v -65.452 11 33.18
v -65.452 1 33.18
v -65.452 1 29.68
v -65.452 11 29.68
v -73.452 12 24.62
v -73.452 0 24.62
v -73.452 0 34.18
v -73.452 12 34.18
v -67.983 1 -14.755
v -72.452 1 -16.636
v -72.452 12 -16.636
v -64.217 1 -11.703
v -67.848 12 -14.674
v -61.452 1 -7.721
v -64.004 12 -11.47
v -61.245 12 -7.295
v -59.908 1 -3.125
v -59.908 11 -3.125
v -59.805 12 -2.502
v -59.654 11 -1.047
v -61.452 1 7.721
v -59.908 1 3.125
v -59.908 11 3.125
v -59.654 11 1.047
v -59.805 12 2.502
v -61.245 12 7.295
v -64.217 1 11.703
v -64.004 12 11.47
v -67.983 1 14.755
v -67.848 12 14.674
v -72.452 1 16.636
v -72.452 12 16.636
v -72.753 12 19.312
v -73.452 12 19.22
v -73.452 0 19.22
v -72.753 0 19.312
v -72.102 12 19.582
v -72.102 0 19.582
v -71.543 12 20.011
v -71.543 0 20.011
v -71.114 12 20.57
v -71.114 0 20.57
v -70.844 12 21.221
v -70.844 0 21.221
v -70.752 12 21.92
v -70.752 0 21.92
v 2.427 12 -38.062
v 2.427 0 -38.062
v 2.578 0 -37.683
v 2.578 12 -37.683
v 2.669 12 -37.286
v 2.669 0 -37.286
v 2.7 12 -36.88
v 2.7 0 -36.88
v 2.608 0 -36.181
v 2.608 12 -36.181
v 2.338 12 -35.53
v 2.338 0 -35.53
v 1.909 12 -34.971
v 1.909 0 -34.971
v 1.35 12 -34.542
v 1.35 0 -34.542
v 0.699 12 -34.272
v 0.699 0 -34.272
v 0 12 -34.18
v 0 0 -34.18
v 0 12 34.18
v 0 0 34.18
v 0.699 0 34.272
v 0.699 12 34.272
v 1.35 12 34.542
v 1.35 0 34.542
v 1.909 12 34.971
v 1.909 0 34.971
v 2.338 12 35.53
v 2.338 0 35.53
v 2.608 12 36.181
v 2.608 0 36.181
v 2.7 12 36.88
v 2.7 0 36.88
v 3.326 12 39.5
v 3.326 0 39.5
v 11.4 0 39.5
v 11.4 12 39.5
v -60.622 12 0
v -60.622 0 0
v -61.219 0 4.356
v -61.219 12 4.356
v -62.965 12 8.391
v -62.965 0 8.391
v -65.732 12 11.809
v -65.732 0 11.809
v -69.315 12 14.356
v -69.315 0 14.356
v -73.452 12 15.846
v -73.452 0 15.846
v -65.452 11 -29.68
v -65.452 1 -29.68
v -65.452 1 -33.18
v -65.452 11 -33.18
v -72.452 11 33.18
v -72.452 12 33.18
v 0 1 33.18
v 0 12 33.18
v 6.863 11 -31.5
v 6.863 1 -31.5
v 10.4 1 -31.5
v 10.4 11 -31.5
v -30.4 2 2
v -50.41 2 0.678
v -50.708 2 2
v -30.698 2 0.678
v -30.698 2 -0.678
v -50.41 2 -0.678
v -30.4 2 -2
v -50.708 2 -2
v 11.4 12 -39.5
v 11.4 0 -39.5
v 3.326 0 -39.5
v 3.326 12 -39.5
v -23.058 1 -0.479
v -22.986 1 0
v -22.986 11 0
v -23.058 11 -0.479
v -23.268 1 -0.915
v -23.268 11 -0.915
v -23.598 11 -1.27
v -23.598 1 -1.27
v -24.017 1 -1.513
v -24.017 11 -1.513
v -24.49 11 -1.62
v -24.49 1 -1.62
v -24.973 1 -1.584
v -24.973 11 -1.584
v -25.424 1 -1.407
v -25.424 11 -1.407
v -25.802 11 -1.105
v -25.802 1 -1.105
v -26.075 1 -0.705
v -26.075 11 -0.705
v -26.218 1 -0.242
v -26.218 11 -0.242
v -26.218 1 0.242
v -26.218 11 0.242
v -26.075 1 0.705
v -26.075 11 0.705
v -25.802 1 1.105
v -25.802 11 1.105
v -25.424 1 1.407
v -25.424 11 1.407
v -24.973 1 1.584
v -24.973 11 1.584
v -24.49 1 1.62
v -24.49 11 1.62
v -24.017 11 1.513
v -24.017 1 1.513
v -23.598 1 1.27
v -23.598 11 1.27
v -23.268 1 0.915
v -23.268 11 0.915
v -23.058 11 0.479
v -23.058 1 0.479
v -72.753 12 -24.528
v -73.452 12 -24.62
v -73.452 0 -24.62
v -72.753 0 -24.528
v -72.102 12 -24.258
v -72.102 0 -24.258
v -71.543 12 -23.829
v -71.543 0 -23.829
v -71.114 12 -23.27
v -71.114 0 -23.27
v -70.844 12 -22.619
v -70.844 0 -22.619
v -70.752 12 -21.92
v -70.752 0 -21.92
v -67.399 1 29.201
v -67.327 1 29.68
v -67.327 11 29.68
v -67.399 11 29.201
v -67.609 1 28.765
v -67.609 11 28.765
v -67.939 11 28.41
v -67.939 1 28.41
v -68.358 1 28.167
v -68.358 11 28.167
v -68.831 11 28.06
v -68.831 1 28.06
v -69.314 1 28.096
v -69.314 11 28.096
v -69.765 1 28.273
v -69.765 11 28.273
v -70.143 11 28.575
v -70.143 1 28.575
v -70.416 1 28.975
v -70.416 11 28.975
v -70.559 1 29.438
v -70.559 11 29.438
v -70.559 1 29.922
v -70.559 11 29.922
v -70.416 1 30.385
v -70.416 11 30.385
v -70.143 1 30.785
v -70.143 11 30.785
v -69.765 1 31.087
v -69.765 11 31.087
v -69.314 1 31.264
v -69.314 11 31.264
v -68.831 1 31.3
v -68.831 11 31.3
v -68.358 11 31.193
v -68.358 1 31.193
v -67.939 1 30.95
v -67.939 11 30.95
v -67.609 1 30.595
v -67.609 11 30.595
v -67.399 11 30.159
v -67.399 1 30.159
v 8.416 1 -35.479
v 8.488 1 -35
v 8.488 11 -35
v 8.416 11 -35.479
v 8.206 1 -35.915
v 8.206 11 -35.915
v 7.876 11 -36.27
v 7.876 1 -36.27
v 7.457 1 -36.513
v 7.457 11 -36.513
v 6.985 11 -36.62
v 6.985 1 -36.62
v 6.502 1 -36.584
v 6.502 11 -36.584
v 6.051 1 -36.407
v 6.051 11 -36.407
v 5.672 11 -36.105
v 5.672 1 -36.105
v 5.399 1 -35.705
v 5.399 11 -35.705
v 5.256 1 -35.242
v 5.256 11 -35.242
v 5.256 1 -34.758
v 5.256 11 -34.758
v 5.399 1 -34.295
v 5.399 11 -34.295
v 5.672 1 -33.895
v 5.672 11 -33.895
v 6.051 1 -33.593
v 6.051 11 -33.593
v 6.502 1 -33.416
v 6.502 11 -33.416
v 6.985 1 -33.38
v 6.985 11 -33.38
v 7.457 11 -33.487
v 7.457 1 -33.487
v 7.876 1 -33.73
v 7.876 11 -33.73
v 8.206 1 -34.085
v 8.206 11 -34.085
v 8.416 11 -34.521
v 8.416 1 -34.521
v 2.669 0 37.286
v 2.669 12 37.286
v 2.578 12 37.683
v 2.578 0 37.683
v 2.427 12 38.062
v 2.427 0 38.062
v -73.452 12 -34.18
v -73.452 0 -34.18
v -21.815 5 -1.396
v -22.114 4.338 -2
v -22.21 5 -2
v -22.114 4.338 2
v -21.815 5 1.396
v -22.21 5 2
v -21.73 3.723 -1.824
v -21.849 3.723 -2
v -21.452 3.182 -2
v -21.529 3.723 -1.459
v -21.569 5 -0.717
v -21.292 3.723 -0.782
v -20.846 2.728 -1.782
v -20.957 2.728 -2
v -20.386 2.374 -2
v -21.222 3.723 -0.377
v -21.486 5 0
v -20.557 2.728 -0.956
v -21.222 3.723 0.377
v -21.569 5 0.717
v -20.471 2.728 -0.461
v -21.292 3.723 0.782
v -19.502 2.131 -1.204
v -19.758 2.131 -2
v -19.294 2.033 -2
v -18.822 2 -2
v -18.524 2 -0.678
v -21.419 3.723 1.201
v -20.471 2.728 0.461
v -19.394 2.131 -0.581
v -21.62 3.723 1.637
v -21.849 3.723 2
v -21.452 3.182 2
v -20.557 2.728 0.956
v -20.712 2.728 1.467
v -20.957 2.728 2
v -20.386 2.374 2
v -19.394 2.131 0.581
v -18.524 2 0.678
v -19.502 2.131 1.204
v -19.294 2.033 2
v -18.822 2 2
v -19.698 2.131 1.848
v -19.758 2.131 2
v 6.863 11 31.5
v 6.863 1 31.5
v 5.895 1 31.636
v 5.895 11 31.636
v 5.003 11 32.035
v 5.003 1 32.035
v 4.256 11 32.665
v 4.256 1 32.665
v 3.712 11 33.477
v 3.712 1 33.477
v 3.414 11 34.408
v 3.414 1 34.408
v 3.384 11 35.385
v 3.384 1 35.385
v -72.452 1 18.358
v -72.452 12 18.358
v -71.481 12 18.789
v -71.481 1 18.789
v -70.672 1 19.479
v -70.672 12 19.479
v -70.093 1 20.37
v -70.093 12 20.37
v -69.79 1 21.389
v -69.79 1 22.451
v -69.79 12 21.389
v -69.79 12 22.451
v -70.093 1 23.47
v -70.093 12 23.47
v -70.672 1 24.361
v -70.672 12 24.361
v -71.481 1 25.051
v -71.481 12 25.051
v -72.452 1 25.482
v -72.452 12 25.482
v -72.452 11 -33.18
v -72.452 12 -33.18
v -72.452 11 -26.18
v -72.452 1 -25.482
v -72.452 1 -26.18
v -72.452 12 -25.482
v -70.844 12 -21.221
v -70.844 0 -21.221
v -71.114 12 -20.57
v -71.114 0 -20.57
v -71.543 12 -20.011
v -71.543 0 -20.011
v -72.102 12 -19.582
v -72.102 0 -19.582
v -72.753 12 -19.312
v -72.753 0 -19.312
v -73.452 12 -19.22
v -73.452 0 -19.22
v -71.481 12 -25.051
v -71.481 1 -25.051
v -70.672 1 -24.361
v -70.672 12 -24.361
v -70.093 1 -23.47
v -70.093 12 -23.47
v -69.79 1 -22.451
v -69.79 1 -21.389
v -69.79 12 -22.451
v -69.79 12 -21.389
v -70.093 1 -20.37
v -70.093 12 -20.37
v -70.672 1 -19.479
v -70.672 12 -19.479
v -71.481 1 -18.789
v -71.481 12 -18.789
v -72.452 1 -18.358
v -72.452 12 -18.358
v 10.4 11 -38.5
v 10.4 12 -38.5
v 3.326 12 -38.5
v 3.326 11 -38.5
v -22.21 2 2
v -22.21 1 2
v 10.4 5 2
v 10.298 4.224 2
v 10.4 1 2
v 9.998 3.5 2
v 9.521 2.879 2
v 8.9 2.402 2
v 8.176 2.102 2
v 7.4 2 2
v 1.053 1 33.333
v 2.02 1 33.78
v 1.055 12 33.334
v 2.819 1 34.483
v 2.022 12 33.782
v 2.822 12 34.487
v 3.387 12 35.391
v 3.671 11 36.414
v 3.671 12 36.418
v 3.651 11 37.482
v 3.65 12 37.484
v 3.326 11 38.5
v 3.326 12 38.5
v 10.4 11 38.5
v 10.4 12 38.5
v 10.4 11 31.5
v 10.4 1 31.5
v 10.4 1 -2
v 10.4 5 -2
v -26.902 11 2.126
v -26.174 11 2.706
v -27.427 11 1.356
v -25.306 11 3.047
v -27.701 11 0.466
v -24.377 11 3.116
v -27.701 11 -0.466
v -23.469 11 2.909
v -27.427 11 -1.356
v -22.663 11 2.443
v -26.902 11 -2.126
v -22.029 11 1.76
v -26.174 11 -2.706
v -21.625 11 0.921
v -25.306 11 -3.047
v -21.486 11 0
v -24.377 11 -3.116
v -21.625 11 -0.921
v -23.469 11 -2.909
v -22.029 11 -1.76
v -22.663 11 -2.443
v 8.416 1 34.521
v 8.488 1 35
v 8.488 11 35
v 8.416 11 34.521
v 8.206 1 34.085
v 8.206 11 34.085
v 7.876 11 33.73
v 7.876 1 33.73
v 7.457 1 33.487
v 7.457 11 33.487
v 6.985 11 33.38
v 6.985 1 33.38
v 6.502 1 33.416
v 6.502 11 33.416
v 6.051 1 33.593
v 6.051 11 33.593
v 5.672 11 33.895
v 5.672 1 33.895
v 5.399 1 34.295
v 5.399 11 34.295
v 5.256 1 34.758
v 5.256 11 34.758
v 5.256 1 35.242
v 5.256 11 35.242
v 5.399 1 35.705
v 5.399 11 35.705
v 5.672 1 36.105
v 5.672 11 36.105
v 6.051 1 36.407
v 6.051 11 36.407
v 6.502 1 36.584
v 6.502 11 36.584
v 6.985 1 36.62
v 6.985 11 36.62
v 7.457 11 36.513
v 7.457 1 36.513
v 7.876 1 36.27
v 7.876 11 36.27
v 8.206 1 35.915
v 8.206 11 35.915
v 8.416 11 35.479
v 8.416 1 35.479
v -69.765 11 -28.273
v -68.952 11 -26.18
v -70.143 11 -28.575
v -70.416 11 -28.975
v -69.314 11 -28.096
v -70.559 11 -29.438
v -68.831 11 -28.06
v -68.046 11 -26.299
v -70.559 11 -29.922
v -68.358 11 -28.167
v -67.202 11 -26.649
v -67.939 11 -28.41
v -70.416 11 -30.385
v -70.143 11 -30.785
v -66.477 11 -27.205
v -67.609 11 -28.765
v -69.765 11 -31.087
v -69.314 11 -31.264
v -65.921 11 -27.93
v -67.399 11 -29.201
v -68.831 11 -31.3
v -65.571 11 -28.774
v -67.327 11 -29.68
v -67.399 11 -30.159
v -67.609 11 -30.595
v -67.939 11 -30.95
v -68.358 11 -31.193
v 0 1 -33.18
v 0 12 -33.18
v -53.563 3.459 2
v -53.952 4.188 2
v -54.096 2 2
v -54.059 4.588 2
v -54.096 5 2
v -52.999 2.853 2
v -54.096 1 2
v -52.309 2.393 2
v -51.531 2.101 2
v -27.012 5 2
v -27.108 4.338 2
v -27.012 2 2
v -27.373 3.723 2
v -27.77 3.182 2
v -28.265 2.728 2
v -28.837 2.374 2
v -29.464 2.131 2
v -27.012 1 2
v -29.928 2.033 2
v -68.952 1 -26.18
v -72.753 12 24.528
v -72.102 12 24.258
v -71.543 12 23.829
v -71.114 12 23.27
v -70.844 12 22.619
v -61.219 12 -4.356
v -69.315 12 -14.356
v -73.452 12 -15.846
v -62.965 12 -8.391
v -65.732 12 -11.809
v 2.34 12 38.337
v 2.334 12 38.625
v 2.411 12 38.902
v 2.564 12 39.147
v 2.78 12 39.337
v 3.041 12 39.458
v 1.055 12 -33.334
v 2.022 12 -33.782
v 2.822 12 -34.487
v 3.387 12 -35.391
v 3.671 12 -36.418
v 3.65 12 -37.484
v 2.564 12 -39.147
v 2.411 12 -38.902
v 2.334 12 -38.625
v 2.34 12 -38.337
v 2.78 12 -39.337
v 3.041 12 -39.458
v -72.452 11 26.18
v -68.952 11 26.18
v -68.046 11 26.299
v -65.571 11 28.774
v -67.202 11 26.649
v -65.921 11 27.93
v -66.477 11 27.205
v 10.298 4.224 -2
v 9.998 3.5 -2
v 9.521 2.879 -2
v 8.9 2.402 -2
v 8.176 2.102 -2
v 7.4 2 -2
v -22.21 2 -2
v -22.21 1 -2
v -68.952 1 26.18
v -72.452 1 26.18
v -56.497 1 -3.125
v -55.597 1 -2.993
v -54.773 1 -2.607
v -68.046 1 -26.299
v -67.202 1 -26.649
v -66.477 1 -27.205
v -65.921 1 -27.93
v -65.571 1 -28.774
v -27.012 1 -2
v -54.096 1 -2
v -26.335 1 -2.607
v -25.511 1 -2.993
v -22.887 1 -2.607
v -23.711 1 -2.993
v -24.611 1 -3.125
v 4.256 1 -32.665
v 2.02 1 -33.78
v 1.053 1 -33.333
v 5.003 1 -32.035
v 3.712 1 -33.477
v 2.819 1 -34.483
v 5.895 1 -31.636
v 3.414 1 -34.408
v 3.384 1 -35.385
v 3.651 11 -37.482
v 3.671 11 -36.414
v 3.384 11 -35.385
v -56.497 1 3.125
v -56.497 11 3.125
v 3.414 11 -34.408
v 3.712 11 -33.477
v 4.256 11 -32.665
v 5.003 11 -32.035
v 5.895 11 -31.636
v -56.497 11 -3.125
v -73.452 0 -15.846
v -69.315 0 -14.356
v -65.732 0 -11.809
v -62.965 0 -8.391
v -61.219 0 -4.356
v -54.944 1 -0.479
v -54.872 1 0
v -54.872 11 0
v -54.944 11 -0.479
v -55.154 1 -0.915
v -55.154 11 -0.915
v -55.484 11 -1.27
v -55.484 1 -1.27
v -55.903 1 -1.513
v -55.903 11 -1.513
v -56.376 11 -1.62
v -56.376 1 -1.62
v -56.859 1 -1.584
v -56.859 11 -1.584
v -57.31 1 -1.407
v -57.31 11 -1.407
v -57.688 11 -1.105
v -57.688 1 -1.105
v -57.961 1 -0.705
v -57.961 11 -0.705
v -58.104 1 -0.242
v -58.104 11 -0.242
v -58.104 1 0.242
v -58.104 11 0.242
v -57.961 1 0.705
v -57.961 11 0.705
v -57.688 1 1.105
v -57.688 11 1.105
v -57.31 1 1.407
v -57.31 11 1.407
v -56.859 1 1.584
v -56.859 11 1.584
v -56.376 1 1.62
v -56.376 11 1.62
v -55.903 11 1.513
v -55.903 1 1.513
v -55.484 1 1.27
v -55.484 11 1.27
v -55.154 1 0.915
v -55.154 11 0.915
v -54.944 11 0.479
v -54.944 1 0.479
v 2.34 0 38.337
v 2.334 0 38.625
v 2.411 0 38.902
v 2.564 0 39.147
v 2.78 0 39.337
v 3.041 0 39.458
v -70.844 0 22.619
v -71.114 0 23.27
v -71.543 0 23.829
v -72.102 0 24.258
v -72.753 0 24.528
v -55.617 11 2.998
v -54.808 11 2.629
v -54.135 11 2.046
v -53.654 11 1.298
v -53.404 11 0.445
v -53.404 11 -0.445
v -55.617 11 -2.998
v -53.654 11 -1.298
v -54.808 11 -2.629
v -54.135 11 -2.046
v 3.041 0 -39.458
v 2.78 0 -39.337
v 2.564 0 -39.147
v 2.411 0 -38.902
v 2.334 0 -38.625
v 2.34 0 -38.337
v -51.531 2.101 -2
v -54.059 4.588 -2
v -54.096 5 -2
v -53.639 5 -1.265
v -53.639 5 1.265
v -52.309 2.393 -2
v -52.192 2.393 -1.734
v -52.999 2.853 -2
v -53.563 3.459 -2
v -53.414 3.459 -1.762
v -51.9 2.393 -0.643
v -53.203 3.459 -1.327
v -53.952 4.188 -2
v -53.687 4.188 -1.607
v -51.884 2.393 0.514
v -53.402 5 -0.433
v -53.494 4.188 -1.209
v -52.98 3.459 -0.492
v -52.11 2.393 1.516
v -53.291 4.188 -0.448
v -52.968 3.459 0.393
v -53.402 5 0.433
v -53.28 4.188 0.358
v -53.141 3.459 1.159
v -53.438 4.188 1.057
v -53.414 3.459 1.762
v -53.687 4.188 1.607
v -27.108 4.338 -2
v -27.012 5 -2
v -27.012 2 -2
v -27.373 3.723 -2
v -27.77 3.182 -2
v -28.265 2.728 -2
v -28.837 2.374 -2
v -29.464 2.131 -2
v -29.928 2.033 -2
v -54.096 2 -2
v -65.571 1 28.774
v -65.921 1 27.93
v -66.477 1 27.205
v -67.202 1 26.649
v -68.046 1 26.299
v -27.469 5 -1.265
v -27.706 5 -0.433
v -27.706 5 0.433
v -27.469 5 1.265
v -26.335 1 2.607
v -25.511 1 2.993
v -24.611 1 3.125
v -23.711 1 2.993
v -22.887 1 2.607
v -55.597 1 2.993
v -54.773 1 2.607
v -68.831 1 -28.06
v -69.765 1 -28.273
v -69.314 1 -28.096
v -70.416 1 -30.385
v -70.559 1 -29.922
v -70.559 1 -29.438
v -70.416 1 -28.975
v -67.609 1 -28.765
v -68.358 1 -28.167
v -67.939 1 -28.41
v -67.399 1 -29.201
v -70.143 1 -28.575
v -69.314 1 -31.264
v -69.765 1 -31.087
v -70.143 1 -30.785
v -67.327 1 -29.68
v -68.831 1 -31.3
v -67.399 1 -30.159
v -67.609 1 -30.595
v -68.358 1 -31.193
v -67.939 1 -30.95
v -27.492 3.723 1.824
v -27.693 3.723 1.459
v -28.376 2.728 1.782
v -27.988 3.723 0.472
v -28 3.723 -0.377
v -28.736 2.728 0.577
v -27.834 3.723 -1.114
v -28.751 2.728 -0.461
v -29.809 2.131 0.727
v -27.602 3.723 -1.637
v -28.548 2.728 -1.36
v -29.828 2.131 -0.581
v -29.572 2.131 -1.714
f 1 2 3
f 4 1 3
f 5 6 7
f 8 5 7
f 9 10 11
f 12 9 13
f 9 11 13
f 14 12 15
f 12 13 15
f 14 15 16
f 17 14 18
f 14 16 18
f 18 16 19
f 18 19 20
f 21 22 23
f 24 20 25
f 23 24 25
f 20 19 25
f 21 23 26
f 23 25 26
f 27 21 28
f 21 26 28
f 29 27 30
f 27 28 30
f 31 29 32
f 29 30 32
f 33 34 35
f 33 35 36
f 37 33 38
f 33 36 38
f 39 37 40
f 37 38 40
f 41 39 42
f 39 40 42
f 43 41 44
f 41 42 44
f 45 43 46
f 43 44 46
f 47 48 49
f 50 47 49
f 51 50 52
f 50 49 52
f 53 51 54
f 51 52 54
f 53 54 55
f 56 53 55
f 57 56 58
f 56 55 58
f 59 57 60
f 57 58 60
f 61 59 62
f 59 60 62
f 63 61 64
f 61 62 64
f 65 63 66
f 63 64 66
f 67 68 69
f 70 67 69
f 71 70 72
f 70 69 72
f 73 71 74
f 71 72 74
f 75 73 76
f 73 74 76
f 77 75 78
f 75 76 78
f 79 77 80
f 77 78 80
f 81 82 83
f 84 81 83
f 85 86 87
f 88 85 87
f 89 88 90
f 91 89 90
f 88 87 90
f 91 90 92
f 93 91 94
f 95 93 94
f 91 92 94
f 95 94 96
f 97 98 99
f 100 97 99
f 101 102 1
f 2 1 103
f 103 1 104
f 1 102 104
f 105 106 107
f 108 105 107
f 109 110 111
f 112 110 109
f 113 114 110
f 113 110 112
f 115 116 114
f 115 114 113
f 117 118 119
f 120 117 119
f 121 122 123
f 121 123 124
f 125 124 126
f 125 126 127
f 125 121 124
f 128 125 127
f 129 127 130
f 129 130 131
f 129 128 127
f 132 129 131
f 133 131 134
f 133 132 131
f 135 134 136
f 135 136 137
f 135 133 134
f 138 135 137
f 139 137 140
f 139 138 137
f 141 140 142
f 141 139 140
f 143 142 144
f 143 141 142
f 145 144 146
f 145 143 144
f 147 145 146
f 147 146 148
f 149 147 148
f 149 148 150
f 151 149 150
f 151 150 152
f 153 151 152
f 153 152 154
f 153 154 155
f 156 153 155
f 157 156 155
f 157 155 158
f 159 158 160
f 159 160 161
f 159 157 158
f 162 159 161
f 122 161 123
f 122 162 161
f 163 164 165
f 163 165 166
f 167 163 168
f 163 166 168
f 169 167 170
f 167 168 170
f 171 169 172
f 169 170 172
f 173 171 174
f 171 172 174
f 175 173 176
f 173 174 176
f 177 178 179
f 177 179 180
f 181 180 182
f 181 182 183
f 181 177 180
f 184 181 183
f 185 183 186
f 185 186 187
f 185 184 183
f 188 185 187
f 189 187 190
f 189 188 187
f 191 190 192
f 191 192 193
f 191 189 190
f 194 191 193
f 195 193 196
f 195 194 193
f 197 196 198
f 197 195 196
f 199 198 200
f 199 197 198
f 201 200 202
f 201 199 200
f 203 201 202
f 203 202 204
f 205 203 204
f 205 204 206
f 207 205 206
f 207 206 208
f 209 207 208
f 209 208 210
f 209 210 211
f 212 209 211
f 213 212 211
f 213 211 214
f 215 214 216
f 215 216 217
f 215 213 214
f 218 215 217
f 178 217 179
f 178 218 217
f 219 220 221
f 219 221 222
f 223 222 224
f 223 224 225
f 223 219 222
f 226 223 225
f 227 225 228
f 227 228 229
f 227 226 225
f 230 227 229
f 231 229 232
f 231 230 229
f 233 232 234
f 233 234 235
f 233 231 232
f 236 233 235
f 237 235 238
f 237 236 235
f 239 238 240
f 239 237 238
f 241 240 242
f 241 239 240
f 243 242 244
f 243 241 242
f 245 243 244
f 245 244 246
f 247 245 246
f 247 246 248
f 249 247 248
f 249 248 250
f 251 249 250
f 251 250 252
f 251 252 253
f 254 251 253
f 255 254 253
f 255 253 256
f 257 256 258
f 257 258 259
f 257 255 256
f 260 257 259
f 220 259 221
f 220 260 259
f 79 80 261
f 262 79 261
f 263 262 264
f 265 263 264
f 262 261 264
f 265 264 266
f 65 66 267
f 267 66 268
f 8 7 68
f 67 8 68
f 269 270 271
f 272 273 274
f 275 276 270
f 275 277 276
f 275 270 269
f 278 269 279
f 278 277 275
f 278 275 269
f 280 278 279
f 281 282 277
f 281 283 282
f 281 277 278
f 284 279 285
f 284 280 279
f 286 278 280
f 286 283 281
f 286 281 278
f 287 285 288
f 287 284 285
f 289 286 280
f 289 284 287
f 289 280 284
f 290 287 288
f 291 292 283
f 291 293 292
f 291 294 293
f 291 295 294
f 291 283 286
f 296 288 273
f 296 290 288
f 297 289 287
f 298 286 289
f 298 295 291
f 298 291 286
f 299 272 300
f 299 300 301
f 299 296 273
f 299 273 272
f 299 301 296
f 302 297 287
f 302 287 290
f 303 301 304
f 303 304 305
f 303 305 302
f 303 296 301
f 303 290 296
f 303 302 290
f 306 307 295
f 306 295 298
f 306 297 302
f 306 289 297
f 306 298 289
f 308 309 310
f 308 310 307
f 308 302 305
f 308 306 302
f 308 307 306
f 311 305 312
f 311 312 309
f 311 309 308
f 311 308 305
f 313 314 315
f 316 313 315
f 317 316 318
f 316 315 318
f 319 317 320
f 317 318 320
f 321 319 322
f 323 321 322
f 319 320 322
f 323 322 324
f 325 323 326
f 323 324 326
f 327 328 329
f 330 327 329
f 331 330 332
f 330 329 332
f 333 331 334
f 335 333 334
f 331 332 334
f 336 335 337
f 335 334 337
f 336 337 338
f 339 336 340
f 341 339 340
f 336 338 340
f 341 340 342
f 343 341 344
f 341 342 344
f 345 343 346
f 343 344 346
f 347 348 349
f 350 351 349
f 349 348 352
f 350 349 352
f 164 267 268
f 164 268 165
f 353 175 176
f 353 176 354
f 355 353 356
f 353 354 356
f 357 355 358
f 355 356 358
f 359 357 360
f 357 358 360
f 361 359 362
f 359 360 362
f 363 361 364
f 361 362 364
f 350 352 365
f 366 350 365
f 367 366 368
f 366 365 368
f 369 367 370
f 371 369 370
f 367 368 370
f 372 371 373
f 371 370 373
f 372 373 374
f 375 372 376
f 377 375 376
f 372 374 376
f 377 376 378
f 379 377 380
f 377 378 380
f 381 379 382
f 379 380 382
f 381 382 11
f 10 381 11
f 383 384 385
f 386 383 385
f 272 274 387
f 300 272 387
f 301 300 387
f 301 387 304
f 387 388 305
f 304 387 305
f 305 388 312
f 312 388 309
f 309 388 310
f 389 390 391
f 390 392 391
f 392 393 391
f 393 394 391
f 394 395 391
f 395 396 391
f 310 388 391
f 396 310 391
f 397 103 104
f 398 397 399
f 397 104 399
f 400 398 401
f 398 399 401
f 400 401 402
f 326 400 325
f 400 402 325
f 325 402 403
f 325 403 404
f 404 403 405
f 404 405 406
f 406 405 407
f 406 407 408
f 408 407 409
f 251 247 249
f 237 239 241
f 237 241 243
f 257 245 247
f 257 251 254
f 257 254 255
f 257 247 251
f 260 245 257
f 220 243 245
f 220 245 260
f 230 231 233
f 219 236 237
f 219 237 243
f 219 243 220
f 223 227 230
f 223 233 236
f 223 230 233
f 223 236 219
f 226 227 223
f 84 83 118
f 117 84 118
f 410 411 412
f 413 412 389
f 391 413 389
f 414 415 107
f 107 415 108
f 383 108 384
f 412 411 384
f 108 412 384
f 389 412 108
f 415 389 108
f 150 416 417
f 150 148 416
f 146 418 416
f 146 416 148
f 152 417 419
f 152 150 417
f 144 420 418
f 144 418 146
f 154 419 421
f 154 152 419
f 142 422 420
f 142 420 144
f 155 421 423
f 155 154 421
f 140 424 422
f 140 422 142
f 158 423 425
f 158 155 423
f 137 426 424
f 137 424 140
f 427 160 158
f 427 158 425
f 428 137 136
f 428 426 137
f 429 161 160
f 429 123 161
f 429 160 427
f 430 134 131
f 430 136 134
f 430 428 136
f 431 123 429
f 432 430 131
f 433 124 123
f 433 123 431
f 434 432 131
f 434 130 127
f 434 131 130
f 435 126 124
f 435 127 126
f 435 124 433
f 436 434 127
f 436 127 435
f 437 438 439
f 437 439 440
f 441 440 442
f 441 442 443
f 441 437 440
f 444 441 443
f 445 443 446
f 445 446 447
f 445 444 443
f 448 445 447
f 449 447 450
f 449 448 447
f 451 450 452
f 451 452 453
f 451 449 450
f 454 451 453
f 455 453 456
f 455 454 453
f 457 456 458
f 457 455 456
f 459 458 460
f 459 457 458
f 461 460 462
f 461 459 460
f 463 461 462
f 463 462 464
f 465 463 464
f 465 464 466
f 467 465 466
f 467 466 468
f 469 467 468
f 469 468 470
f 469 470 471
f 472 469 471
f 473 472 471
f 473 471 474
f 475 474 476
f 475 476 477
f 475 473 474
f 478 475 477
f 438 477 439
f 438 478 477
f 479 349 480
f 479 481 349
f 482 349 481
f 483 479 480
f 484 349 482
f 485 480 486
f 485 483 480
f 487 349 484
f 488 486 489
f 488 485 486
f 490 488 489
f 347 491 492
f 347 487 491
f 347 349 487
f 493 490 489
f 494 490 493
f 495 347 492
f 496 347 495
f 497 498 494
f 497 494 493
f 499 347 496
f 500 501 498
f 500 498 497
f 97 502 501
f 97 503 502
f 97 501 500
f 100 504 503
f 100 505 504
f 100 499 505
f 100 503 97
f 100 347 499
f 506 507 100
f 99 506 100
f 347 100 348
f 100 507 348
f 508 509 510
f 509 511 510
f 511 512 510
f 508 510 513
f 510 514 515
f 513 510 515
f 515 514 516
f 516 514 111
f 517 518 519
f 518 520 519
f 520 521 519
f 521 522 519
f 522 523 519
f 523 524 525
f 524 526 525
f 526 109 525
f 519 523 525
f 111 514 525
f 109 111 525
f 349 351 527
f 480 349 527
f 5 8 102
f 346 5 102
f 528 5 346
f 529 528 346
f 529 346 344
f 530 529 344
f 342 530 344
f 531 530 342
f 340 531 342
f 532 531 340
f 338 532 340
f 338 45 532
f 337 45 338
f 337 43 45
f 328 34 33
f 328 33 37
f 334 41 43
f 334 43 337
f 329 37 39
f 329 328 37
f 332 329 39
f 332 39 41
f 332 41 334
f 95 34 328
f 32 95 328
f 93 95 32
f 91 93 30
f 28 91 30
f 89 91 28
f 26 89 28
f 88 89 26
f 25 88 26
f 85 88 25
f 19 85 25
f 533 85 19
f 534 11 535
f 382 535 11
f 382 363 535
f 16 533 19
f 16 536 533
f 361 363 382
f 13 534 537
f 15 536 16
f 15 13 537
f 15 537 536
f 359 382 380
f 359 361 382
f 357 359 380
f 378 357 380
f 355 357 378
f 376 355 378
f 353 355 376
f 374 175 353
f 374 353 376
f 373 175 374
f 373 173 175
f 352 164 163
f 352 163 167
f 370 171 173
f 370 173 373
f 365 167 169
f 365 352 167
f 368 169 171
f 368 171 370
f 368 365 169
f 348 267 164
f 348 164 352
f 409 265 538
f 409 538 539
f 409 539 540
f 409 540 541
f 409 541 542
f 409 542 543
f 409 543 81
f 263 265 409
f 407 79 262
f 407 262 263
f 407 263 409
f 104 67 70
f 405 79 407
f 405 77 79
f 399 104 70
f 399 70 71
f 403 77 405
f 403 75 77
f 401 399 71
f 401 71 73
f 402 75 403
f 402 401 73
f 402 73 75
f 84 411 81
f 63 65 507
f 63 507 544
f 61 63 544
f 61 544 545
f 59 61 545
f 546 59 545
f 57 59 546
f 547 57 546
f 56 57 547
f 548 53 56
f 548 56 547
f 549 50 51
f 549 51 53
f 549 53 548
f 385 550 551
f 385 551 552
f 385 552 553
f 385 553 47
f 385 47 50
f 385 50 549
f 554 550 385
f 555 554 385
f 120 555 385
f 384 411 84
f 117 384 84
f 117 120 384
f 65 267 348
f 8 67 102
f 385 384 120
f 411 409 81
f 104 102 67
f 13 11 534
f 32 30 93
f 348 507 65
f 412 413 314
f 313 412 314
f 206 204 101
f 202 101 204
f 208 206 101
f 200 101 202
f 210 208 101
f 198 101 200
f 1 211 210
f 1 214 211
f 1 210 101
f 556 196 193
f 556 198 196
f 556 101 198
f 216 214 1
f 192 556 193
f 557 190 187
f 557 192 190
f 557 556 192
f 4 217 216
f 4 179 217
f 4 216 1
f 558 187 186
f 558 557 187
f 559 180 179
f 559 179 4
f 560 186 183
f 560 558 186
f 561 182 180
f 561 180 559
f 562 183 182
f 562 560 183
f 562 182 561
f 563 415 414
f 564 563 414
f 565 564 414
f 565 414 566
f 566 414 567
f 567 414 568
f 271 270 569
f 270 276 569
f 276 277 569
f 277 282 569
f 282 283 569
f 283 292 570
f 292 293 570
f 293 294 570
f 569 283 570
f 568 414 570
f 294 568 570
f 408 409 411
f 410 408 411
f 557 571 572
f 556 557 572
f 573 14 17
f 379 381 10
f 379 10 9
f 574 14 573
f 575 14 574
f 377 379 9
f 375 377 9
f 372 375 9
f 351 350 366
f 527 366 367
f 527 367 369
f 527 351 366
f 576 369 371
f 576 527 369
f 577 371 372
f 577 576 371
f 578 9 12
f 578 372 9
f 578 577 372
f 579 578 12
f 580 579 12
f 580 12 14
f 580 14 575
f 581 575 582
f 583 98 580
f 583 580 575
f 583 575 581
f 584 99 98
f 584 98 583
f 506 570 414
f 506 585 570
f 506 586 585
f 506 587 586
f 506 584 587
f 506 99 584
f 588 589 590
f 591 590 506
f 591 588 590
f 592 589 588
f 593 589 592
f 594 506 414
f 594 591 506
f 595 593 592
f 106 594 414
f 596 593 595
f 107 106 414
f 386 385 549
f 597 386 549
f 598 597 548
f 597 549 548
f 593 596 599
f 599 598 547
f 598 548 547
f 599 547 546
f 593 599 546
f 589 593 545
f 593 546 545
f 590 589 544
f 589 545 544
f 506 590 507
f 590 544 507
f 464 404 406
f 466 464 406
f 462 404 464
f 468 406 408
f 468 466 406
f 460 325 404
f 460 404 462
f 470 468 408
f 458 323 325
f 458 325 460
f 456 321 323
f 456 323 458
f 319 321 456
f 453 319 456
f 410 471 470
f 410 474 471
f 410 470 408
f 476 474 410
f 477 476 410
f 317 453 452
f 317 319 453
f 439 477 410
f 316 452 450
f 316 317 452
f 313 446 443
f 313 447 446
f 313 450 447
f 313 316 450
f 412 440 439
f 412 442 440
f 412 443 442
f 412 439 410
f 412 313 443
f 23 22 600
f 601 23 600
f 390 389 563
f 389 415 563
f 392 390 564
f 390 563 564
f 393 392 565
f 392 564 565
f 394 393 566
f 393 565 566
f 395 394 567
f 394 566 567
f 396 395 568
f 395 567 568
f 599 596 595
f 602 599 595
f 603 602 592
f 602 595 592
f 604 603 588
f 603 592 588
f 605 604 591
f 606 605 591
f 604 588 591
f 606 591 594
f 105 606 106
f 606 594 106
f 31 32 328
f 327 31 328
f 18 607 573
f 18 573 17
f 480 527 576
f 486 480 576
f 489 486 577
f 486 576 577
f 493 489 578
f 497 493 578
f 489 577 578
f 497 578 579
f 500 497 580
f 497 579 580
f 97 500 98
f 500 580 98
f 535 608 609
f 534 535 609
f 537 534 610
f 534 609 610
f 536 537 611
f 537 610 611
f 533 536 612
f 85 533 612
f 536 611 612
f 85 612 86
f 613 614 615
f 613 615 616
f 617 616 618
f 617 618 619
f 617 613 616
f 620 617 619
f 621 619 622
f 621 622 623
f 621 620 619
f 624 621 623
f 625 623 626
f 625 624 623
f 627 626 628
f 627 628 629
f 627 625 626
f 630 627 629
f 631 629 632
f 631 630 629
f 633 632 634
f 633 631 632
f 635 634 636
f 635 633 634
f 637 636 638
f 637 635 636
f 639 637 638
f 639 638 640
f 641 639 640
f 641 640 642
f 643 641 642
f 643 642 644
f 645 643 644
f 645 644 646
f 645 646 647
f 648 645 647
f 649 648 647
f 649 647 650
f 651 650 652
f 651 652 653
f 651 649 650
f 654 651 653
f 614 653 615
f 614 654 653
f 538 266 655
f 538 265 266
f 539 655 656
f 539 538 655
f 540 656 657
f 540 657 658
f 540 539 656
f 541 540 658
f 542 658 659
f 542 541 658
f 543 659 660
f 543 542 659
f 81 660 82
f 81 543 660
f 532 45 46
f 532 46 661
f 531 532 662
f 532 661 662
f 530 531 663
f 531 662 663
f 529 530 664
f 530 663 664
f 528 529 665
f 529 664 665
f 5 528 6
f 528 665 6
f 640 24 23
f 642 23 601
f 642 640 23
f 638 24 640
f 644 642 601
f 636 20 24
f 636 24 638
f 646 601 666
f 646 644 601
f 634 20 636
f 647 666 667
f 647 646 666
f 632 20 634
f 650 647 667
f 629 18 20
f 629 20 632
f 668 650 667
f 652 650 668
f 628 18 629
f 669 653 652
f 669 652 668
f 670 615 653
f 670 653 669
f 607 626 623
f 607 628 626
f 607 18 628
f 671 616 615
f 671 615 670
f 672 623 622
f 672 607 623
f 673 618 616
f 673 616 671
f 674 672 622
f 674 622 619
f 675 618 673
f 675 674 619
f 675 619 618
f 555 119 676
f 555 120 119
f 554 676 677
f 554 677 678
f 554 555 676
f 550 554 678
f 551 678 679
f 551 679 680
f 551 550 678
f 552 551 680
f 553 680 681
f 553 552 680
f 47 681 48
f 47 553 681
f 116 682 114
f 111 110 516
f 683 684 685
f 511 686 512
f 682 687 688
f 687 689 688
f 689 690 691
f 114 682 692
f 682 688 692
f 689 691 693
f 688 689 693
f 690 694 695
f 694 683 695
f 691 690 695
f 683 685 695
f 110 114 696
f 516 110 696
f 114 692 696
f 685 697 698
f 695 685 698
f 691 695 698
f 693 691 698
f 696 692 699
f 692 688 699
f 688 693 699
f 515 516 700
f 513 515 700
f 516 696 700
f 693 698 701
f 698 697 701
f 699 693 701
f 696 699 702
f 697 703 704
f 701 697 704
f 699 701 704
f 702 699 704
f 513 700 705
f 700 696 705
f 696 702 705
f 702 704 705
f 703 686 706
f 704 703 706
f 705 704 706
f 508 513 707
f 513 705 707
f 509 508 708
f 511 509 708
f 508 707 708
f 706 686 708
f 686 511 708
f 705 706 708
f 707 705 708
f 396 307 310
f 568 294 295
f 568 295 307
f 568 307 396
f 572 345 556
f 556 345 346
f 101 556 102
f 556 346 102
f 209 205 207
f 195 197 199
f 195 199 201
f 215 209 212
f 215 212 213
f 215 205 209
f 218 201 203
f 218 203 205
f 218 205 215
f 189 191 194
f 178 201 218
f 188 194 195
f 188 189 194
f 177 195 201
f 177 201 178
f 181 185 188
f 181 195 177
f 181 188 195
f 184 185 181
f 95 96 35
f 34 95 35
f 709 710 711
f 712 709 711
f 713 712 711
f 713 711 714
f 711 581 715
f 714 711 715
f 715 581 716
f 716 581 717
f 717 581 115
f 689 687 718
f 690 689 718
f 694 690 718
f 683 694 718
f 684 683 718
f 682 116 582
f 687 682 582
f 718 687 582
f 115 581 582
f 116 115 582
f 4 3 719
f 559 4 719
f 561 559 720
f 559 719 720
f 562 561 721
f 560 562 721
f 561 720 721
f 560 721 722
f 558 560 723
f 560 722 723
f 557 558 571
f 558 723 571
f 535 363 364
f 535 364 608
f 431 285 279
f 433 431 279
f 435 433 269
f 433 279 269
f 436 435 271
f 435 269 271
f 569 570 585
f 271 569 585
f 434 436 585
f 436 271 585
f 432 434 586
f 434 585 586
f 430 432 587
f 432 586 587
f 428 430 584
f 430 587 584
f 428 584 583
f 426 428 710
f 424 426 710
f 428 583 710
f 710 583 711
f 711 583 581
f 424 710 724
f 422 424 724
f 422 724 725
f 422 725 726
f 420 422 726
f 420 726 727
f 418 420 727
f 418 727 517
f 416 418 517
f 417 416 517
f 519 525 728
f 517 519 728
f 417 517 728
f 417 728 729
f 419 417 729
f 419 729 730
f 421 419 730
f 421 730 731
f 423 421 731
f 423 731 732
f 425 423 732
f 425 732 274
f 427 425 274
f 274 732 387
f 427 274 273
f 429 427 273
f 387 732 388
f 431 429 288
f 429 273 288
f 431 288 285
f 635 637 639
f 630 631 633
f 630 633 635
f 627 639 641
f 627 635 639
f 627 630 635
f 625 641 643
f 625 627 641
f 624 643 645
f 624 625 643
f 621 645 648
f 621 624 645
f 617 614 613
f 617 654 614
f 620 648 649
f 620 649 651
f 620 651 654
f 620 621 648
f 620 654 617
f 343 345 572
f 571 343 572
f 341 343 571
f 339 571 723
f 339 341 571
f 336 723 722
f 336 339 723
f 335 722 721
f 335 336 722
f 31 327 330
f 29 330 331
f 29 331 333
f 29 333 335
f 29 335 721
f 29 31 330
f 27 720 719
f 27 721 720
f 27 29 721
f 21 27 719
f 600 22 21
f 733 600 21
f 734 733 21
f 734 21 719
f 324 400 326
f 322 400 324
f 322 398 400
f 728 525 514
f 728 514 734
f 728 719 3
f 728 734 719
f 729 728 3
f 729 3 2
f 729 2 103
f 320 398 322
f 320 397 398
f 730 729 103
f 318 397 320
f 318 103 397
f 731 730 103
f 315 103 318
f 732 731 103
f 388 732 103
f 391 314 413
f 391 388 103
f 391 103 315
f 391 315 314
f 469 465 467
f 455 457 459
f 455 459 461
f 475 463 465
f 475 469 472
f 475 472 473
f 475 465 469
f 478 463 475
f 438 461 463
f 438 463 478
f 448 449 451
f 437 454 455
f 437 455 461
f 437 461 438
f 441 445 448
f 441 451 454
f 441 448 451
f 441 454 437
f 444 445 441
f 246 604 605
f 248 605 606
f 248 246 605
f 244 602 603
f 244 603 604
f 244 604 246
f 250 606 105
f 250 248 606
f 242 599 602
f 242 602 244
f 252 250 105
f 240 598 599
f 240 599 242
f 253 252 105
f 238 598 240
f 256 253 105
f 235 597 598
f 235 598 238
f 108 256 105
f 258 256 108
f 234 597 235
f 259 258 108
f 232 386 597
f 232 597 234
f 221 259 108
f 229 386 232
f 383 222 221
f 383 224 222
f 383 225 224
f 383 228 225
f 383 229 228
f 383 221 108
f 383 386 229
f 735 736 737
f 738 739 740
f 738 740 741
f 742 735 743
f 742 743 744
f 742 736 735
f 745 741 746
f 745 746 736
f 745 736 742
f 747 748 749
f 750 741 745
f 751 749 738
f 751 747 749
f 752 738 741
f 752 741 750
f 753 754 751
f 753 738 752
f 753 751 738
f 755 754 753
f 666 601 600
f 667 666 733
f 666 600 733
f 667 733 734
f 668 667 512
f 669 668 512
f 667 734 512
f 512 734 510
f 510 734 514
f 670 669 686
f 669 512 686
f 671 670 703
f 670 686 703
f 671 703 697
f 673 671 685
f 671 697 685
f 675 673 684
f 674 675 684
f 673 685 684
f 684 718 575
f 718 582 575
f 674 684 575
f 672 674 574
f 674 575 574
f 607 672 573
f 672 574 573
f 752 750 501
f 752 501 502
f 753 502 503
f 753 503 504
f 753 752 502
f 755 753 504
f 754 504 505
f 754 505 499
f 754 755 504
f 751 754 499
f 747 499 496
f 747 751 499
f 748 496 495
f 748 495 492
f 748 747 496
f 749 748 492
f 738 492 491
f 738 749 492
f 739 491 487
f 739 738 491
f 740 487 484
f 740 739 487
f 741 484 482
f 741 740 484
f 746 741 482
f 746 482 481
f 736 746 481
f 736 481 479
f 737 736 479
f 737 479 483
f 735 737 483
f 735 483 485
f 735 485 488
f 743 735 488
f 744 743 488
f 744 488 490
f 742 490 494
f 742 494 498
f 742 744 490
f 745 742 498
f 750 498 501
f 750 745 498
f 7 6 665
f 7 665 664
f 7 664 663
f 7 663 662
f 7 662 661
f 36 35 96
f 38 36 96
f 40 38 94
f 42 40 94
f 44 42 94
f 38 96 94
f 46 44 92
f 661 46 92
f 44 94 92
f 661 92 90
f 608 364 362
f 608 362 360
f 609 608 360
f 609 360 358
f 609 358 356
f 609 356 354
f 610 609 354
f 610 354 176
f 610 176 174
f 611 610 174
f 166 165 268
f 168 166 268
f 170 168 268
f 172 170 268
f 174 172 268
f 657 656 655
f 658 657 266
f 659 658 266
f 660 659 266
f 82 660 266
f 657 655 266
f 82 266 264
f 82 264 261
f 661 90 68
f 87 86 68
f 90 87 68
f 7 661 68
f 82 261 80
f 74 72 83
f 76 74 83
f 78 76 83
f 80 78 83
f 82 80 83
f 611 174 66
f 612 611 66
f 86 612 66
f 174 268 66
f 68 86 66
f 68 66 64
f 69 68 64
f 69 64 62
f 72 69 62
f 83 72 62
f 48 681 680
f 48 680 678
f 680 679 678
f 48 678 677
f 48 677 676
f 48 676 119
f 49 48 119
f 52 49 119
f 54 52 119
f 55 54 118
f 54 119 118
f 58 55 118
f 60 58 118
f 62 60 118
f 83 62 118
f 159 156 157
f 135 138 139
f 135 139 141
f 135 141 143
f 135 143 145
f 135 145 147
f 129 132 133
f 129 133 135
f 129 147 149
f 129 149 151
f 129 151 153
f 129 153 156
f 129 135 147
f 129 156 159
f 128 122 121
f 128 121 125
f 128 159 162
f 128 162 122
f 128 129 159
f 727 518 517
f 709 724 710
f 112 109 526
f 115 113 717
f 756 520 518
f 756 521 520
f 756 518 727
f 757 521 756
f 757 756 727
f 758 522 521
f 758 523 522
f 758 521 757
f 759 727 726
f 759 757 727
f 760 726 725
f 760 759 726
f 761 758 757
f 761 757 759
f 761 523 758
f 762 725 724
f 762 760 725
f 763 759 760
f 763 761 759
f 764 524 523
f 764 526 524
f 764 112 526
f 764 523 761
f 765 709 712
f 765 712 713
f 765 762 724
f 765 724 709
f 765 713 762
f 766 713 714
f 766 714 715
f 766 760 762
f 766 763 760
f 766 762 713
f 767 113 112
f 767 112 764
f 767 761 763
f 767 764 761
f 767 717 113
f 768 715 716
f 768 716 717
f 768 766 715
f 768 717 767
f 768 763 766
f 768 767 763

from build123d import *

# Parameters (mm, degrees)
BASE_SHAPE_DEPTH           = 12
FILLETS_R                  = 1
INSIDE_CUT_DEPTH           = 11
SKETCH3_R                  = 1.625
SKETCH3_R_2                = 3.125
MOUNTING_POSTS_DEPTH       = 10
CENTER_REINFORCEMENT_DEPTH = 1
REINFORCEMENT_FILLETS_R    = 3


with BuildPart() as part:
    # Sketch1 → Base shape (new body)
    with BuildSketch(Plane(origin=(0, 0, 0), x_dir=(1, 0, 0), z_dir=(0, 1, 0))):
        with BuildLine():
            ThreePointArc((2.7, 36.88), (1.909188309, 34.970811691), (0, 34.18))
            Line((0, 34.18), (-73.452025159, 34.18))
            Line((-73.452025159, 34.18), (-73.452025159, 24.62))
            ThreePointArc((-73.452025159, 24.62), (-71.54283685, 23.829188309), (-70.752025159, 21.92))
            ThreePointArc((-70.752025159, 21.92), (-71.54283685, 20.010811691), (-73.452025159, 19.22))
            Line((-73.452025159, 19.22), (-73.452025159, 15.845601913))
            ThreePointArc((-73.452025159, 15.845601913), (-64.231671709, 10.194263093), (-60.622025159, 0))
            ThreePointArc((-60.622025159, 0), (-64.231671709, -10.194263093), (-73.452025159, -15.845601913))
            Line((-73.452025159, -15.845601913), (-73.452025159, -19.22))
            ThreePointArc((-73.452025159, -19.22), (-71.54283685, -20.010811691), (-70.752025159, -21.92))
            ThreePointArc((-70.752025159, -21.92), (-71.54283685, -23.829188309), (-73.452025159, -24.62))
            Line((-73.452025159, -24.62), (-73.452025159, -34.18))
            Line((-73.452025159, -34.18), (0, -34.18))
            ThreePointArc((0, -34.18), (1.909188309, -34.970811691), (2.7, -36.88))
            ThreePointArc((2.7, -36.88), (2.127372404, -38.542614403), (0.652380257, -39.5))
            Line((0.652380257, -39.5), (11.4, -39.5))
            Line((11.4, -39.5), (11.4, 39.5))
            Line((11.4, 39.5), (0.652380257, 39.5))
            ThreePointArc((0.652380257, 39.5), (2.127372404, 38.542614403), (2.7, 36.88))
        make_face()
    extrude(amount=BASE_SHAPE_DEPTH)

    # Fillets
    fillets_edges = [part.edges().sort_by_distance(p)[0] for p in [
        (0.652380257, 6, -39.5),
        (0.652380257, 6, 39.5),
    ]]
    fillet(fillets_edges, radius=FILLETS_R)

    # Sketch2 → Inside cut (cut)
    with BuildSketch(Plane(origin=(0, 12, 0), x_dir=(1, 0, 0), z_dir=(0, 1, 0))):
        with BuildLine():
            Line((10.4, 38.5), (3.326499662, 38.5))
            ThreePointArc((3.326499662, 38.5), (3.1371962, 34.918368026), (0, 33.18))
            Line((0, 33.18), (-72.452025159, 33.18))
            Line((-72.452025159, 33.18), (-72.452025159, 25.482302626))
            ThreePointArc((-72.452025159, 25.482302626), (-69.752025159, 21.92), (-72.452025159, 18.357697374))
            Line((-72.452025159, 18.357697374), (-72.452025159, 16.635597374))
            ThreePointArc((-72.452025159, 16.635597374), (-59.622025159, 0), (-72.452025159, -16.635597374))
            Line((-72.452025159, -16.635597374), (-72.452025159, -18.357697374))
            ThreePointArc((-72.452025159, -18.357697374), (-69.752025159, -21.92), (-72.452025159, -25.482302626))
            Line((-72.452025159, -25.482302626), (-72.452025159, -33.18))
            Line((-72.452025159, -33.18), (0, -33.18))
            ThreePointArc((0, -33.18), (3.1371962, -34.918368026), (3.326499662, -38.5))
            Line((3.326499662, -38.5), (10.4, -38.5))
            Line((10.4, -38.5), (10.4, 38.5))
        make_face()
    extrude(amount=-INSIDE_CUT_DEPTH, mode=Mode.SUBTRACT)

    # Sketch3 → Mounting posts (add)
    with BuildSketch(Plane(origin=(0, 1, 0), x_dir=(1, 0, 0), z_dir=(0, 1, 0))):
        with BuildLine():
            Line((-72.452025159, 26.18), (-68.952025159, 26.18))
            ThreePointArc((-68.952025159, 26.18), (-66.477151425, 27.205126266), (-65.452025159, 29.68))
            Line((-65.452025159, 29.68), (-65.452025159, 33.18))
            Line((-65.452025159, 33.18), (-72.452025159, 33.18))
            Line((-72.452025159, 33.18), (-72.452025159, 26.18))
        make_face()
        with Locations((-68.952025159, 29.68)):
            Circle(SKETCH3_R, mode=Mode.SUBTRACT)
        with BuildLine():
            ThreePointArc((3.384479038, 35.38490748), (4.255839604, 32.665174116), (6.863249831, 31.5))
            Line((6.863249831, 31.5), (10.4, 31.5))
            Line((10.4, 31.5), (10.4, 38.5))
            Line((10.4, 38.5), (3.326499662, 38.5))
            ThreePointArc((3.326499662, 38.5), (3.699359286, 36.948853988), (3.384479038, 35.38490748))
        make_face()
        with Locations((6.863249831, 35)):
            Circle(SKETCH3_R, mode=Mode.SUBTRACT)
        with BuildLine():
            Line((-56.497025159, 3.125), (-59.908291834, 3.125))
            ThreePointArc((-59.908291834, 3.125), (-59.622025159, 0), (-59.908291834, -3.125))
            Line((-59.908291834, -3.125), (-56.497025159, -3.125))
            ThreePointArc((-56.497025159, -3.125), (-53.372025159, 0), (-56.497025159, 3.125))
        make_face()
        with Locations((-56.497025159, 0)):
            Circle(SKETCH3_R, mode=Mode.SUBTRACT)
        with BuildLine():
            Line((10.4, -38.5), (10.4, -31.5))
            Line((10.4, -31.5), (6.863249831, -31.5))
            ThreePointArc((6.863249831, -31.5), (4.255839604, -32.665174116), (3.384479038, -35.38490748))
            ThreePointArc((3.384479038, -35.38490748), (3.699359286, -36.948853988), (3.326499662, -38.5))
            Line((3.326499662, -38.5), (10.4, -38.5))
        make_face()
        with Locations((6.863249831, -35)):
            Circle(SKETCH3_R, mode=Mode.SUBTRACT)
        with BuildLine():
            Line((-68.952025159, -26.18), (-72.452025159, -26.18))
            Line((-72.452025159, -26.18), (-72.452025159, -33.18))
            Line((-72.452025159, -33.18), (-65.452025159, -33.18))
            Line((-65.452025159, -33.18), (-65.452025159, -29.68))
            ThreePointArc((-65.452025159, -29.68), (-66.477151425, -27.205126266), (-68.952025159, -26.18))
        make_face()
        with Locations((-68.952025159, -29.68)):
            Circle(SKETCH3_R, mode=Mode.SUBTRACT)
        with Locations((-24.61101258, 0)):
            Circle(SKETCH3_R_2)
        with Locations((-24.61101258, 0)):
            Circle(SKETCH3_R, mode=Mode.SUBTRACT)
    extrude(amount=MOUNTING_POSTS_DEPTH)

    # Sketch4 → Center reinforcement (add)
    with BuildSketch(Plane(origin=(0, 1, 0), x_dir=(1, 0, 0), z_dir=(0, 1, 0))):
        with BuildLine():
            Line((-27.012184169, 2), (-54.09585357, 2))
            ThreePointArc((-54.09585357, 2), (-53.372025159, 0), (-54.09585357, -2))
            Line((-54.09585357, -2), (-27.012184169, -2))
            ThreePointArc((-27.012184169, -2), (-27.73601258, 0), (-27.012184169, 2))
        make_face()
        with BuildLine():
            Line((10.4, 2), (-22.209840991, 2))
            ThreePointArc((-22.209840991, 2), (-21.672536255, 1.063476324), (-21.48601258, 0))
            ThreePointArc((-21.48601258, 0), (-21.672536255, -1.063476324), (-22.209840991, -2))
            Line((-22.209840991, -2), (10.4, -2))
            Line((10.4, -2), (10.4, 2))
        make_face()
    extrude(amount=CENTER_REINFORCEMENT_DEPTH)

    # Reinforcement fillets
    reinforcement_fillets_edges = [part.edges().sort_by_distance(p)[0] for p in [
        (-53.372025159, 2, 0),
        (-27.73601258, 2, 0),
        (-21.672536255, 2, 1.063476324),
        (10.4, 2, 0),
    ]]
    fillet(reinforcement_fillets_edges, radius=REINFORCEMENT_FILLETS_R)


solid = part.part
